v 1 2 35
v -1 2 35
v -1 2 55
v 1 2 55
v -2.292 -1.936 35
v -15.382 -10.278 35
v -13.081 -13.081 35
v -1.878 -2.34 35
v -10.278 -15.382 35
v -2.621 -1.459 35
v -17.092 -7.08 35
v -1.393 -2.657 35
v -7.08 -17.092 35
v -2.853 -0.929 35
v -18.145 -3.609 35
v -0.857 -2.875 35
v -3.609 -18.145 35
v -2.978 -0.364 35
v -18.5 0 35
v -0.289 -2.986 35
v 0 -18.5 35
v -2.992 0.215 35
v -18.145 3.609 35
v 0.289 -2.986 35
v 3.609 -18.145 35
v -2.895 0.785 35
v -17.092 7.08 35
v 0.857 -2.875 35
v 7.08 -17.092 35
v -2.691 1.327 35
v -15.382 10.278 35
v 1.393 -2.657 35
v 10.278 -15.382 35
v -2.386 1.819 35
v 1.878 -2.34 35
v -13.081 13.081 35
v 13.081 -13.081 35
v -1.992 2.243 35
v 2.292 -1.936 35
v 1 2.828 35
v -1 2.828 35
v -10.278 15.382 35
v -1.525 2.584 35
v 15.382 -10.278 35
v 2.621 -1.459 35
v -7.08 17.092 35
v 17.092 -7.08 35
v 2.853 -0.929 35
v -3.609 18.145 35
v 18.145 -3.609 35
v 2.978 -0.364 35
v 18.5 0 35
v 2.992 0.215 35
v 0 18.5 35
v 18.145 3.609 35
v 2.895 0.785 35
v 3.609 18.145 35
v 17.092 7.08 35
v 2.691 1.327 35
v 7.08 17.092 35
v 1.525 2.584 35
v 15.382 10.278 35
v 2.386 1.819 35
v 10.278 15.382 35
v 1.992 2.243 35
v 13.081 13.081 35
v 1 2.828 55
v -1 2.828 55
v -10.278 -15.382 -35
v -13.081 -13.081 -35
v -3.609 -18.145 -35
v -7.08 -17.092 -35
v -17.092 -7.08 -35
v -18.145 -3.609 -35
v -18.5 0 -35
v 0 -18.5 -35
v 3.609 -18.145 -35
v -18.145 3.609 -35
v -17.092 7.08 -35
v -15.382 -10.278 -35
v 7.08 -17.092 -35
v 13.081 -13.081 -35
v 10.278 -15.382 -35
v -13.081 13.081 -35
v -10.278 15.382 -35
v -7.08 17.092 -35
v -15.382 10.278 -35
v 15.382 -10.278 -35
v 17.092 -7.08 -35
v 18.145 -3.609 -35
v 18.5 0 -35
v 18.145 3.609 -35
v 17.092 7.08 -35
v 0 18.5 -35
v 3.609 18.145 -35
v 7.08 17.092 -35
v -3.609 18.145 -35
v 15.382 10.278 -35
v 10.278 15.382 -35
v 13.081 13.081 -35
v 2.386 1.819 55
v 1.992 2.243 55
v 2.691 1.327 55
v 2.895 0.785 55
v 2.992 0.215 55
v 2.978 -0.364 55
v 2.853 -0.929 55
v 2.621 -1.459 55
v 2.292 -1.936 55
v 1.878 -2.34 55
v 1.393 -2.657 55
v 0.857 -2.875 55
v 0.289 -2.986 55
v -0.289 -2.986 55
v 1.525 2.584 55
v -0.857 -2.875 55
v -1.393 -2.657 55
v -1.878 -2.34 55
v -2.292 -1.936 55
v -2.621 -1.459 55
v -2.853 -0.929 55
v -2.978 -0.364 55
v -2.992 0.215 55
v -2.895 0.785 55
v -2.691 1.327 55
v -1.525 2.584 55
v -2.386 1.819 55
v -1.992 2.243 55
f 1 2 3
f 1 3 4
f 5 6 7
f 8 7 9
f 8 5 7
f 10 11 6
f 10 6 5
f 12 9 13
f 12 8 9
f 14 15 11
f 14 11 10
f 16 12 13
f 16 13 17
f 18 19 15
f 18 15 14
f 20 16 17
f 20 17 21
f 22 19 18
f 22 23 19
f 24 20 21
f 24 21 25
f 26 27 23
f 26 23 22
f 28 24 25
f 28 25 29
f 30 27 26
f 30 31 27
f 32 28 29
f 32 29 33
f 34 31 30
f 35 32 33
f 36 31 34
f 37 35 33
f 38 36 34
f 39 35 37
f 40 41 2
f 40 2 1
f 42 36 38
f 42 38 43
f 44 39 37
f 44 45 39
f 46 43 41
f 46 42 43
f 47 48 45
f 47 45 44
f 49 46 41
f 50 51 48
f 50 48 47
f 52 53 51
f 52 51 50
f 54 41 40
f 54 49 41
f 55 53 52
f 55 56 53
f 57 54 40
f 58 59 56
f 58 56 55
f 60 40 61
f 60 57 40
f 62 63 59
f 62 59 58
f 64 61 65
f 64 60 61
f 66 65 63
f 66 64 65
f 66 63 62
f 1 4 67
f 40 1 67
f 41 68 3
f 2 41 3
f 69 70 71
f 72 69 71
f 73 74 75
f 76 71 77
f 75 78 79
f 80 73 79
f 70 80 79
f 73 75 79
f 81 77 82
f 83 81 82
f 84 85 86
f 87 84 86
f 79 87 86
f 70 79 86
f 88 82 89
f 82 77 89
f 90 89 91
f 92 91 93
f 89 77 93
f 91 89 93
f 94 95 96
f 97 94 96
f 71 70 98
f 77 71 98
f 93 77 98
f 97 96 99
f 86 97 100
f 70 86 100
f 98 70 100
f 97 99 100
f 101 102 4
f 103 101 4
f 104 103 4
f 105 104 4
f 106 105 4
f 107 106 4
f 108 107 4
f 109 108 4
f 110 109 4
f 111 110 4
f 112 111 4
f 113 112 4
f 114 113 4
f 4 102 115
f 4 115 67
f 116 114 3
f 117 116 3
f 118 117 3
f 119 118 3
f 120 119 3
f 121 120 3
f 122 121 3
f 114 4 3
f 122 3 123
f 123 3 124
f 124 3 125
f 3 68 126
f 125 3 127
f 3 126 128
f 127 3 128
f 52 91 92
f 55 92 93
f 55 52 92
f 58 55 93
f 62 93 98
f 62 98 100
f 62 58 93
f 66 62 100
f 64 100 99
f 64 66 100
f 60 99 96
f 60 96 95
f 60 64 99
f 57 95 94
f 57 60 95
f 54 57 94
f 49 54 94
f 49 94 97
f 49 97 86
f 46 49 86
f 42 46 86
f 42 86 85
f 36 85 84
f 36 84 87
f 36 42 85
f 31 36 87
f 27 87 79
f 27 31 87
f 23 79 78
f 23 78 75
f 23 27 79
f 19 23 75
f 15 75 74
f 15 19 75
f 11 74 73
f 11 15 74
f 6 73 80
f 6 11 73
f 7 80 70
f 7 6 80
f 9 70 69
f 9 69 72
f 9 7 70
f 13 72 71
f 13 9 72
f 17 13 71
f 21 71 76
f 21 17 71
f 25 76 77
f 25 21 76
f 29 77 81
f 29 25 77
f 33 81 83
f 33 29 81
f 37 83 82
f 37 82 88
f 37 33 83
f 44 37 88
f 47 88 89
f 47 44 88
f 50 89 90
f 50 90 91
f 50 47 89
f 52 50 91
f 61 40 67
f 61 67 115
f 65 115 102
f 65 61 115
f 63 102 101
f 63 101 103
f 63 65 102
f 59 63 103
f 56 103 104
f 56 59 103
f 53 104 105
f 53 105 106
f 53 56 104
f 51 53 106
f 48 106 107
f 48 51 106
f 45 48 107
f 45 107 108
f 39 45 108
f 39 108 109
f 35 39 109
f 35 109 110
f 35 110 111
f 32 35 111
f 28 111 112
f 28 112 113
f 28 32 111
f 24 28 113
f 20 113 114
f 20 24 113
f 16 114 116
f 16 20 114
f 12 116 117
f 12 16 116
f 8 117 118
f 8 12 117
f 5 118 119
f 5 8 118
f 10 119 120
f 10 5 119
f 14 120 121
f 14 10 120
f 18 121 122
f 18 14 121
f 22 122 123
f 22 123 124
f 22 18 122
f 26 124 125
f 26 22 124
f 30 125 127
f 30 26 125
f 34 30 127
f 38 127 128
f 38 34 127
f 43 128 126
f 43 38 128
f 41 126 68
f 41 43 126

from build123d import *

# Parameters (mm, degrees)
SKETCH_1_R      = 18.5
EXTRUDE_1_DEPTH = 35
EXTRUDE_2_DEPTH = 20


with BuildPart() as part:
    # 草图1 → 凸台-拉伸1 (new, symmetric)
    with BuildSketch(Plane.XY):
        Circle(SKETCH_1_R)
    extrude(amount=EXTRUDE_1_DEPTH, both=True)

    # 草图2 → 凸台-拉伸2 (add)
    with BuildSketch(Plane.XY.offset(35)):
        with BuildLine():
            Line((-1, 2.828427125), (-1, 2))
            Line((-1, 2), (1, 2))
            Line((1, 2), (1, 2.828427125))
            ThreePointArc((1, 2.828427125), (0, -3), (-1, 2.828427125))
        make_face()
    extrude(amount=EXTRUDE_2_DEPTH)


solid = part.part
